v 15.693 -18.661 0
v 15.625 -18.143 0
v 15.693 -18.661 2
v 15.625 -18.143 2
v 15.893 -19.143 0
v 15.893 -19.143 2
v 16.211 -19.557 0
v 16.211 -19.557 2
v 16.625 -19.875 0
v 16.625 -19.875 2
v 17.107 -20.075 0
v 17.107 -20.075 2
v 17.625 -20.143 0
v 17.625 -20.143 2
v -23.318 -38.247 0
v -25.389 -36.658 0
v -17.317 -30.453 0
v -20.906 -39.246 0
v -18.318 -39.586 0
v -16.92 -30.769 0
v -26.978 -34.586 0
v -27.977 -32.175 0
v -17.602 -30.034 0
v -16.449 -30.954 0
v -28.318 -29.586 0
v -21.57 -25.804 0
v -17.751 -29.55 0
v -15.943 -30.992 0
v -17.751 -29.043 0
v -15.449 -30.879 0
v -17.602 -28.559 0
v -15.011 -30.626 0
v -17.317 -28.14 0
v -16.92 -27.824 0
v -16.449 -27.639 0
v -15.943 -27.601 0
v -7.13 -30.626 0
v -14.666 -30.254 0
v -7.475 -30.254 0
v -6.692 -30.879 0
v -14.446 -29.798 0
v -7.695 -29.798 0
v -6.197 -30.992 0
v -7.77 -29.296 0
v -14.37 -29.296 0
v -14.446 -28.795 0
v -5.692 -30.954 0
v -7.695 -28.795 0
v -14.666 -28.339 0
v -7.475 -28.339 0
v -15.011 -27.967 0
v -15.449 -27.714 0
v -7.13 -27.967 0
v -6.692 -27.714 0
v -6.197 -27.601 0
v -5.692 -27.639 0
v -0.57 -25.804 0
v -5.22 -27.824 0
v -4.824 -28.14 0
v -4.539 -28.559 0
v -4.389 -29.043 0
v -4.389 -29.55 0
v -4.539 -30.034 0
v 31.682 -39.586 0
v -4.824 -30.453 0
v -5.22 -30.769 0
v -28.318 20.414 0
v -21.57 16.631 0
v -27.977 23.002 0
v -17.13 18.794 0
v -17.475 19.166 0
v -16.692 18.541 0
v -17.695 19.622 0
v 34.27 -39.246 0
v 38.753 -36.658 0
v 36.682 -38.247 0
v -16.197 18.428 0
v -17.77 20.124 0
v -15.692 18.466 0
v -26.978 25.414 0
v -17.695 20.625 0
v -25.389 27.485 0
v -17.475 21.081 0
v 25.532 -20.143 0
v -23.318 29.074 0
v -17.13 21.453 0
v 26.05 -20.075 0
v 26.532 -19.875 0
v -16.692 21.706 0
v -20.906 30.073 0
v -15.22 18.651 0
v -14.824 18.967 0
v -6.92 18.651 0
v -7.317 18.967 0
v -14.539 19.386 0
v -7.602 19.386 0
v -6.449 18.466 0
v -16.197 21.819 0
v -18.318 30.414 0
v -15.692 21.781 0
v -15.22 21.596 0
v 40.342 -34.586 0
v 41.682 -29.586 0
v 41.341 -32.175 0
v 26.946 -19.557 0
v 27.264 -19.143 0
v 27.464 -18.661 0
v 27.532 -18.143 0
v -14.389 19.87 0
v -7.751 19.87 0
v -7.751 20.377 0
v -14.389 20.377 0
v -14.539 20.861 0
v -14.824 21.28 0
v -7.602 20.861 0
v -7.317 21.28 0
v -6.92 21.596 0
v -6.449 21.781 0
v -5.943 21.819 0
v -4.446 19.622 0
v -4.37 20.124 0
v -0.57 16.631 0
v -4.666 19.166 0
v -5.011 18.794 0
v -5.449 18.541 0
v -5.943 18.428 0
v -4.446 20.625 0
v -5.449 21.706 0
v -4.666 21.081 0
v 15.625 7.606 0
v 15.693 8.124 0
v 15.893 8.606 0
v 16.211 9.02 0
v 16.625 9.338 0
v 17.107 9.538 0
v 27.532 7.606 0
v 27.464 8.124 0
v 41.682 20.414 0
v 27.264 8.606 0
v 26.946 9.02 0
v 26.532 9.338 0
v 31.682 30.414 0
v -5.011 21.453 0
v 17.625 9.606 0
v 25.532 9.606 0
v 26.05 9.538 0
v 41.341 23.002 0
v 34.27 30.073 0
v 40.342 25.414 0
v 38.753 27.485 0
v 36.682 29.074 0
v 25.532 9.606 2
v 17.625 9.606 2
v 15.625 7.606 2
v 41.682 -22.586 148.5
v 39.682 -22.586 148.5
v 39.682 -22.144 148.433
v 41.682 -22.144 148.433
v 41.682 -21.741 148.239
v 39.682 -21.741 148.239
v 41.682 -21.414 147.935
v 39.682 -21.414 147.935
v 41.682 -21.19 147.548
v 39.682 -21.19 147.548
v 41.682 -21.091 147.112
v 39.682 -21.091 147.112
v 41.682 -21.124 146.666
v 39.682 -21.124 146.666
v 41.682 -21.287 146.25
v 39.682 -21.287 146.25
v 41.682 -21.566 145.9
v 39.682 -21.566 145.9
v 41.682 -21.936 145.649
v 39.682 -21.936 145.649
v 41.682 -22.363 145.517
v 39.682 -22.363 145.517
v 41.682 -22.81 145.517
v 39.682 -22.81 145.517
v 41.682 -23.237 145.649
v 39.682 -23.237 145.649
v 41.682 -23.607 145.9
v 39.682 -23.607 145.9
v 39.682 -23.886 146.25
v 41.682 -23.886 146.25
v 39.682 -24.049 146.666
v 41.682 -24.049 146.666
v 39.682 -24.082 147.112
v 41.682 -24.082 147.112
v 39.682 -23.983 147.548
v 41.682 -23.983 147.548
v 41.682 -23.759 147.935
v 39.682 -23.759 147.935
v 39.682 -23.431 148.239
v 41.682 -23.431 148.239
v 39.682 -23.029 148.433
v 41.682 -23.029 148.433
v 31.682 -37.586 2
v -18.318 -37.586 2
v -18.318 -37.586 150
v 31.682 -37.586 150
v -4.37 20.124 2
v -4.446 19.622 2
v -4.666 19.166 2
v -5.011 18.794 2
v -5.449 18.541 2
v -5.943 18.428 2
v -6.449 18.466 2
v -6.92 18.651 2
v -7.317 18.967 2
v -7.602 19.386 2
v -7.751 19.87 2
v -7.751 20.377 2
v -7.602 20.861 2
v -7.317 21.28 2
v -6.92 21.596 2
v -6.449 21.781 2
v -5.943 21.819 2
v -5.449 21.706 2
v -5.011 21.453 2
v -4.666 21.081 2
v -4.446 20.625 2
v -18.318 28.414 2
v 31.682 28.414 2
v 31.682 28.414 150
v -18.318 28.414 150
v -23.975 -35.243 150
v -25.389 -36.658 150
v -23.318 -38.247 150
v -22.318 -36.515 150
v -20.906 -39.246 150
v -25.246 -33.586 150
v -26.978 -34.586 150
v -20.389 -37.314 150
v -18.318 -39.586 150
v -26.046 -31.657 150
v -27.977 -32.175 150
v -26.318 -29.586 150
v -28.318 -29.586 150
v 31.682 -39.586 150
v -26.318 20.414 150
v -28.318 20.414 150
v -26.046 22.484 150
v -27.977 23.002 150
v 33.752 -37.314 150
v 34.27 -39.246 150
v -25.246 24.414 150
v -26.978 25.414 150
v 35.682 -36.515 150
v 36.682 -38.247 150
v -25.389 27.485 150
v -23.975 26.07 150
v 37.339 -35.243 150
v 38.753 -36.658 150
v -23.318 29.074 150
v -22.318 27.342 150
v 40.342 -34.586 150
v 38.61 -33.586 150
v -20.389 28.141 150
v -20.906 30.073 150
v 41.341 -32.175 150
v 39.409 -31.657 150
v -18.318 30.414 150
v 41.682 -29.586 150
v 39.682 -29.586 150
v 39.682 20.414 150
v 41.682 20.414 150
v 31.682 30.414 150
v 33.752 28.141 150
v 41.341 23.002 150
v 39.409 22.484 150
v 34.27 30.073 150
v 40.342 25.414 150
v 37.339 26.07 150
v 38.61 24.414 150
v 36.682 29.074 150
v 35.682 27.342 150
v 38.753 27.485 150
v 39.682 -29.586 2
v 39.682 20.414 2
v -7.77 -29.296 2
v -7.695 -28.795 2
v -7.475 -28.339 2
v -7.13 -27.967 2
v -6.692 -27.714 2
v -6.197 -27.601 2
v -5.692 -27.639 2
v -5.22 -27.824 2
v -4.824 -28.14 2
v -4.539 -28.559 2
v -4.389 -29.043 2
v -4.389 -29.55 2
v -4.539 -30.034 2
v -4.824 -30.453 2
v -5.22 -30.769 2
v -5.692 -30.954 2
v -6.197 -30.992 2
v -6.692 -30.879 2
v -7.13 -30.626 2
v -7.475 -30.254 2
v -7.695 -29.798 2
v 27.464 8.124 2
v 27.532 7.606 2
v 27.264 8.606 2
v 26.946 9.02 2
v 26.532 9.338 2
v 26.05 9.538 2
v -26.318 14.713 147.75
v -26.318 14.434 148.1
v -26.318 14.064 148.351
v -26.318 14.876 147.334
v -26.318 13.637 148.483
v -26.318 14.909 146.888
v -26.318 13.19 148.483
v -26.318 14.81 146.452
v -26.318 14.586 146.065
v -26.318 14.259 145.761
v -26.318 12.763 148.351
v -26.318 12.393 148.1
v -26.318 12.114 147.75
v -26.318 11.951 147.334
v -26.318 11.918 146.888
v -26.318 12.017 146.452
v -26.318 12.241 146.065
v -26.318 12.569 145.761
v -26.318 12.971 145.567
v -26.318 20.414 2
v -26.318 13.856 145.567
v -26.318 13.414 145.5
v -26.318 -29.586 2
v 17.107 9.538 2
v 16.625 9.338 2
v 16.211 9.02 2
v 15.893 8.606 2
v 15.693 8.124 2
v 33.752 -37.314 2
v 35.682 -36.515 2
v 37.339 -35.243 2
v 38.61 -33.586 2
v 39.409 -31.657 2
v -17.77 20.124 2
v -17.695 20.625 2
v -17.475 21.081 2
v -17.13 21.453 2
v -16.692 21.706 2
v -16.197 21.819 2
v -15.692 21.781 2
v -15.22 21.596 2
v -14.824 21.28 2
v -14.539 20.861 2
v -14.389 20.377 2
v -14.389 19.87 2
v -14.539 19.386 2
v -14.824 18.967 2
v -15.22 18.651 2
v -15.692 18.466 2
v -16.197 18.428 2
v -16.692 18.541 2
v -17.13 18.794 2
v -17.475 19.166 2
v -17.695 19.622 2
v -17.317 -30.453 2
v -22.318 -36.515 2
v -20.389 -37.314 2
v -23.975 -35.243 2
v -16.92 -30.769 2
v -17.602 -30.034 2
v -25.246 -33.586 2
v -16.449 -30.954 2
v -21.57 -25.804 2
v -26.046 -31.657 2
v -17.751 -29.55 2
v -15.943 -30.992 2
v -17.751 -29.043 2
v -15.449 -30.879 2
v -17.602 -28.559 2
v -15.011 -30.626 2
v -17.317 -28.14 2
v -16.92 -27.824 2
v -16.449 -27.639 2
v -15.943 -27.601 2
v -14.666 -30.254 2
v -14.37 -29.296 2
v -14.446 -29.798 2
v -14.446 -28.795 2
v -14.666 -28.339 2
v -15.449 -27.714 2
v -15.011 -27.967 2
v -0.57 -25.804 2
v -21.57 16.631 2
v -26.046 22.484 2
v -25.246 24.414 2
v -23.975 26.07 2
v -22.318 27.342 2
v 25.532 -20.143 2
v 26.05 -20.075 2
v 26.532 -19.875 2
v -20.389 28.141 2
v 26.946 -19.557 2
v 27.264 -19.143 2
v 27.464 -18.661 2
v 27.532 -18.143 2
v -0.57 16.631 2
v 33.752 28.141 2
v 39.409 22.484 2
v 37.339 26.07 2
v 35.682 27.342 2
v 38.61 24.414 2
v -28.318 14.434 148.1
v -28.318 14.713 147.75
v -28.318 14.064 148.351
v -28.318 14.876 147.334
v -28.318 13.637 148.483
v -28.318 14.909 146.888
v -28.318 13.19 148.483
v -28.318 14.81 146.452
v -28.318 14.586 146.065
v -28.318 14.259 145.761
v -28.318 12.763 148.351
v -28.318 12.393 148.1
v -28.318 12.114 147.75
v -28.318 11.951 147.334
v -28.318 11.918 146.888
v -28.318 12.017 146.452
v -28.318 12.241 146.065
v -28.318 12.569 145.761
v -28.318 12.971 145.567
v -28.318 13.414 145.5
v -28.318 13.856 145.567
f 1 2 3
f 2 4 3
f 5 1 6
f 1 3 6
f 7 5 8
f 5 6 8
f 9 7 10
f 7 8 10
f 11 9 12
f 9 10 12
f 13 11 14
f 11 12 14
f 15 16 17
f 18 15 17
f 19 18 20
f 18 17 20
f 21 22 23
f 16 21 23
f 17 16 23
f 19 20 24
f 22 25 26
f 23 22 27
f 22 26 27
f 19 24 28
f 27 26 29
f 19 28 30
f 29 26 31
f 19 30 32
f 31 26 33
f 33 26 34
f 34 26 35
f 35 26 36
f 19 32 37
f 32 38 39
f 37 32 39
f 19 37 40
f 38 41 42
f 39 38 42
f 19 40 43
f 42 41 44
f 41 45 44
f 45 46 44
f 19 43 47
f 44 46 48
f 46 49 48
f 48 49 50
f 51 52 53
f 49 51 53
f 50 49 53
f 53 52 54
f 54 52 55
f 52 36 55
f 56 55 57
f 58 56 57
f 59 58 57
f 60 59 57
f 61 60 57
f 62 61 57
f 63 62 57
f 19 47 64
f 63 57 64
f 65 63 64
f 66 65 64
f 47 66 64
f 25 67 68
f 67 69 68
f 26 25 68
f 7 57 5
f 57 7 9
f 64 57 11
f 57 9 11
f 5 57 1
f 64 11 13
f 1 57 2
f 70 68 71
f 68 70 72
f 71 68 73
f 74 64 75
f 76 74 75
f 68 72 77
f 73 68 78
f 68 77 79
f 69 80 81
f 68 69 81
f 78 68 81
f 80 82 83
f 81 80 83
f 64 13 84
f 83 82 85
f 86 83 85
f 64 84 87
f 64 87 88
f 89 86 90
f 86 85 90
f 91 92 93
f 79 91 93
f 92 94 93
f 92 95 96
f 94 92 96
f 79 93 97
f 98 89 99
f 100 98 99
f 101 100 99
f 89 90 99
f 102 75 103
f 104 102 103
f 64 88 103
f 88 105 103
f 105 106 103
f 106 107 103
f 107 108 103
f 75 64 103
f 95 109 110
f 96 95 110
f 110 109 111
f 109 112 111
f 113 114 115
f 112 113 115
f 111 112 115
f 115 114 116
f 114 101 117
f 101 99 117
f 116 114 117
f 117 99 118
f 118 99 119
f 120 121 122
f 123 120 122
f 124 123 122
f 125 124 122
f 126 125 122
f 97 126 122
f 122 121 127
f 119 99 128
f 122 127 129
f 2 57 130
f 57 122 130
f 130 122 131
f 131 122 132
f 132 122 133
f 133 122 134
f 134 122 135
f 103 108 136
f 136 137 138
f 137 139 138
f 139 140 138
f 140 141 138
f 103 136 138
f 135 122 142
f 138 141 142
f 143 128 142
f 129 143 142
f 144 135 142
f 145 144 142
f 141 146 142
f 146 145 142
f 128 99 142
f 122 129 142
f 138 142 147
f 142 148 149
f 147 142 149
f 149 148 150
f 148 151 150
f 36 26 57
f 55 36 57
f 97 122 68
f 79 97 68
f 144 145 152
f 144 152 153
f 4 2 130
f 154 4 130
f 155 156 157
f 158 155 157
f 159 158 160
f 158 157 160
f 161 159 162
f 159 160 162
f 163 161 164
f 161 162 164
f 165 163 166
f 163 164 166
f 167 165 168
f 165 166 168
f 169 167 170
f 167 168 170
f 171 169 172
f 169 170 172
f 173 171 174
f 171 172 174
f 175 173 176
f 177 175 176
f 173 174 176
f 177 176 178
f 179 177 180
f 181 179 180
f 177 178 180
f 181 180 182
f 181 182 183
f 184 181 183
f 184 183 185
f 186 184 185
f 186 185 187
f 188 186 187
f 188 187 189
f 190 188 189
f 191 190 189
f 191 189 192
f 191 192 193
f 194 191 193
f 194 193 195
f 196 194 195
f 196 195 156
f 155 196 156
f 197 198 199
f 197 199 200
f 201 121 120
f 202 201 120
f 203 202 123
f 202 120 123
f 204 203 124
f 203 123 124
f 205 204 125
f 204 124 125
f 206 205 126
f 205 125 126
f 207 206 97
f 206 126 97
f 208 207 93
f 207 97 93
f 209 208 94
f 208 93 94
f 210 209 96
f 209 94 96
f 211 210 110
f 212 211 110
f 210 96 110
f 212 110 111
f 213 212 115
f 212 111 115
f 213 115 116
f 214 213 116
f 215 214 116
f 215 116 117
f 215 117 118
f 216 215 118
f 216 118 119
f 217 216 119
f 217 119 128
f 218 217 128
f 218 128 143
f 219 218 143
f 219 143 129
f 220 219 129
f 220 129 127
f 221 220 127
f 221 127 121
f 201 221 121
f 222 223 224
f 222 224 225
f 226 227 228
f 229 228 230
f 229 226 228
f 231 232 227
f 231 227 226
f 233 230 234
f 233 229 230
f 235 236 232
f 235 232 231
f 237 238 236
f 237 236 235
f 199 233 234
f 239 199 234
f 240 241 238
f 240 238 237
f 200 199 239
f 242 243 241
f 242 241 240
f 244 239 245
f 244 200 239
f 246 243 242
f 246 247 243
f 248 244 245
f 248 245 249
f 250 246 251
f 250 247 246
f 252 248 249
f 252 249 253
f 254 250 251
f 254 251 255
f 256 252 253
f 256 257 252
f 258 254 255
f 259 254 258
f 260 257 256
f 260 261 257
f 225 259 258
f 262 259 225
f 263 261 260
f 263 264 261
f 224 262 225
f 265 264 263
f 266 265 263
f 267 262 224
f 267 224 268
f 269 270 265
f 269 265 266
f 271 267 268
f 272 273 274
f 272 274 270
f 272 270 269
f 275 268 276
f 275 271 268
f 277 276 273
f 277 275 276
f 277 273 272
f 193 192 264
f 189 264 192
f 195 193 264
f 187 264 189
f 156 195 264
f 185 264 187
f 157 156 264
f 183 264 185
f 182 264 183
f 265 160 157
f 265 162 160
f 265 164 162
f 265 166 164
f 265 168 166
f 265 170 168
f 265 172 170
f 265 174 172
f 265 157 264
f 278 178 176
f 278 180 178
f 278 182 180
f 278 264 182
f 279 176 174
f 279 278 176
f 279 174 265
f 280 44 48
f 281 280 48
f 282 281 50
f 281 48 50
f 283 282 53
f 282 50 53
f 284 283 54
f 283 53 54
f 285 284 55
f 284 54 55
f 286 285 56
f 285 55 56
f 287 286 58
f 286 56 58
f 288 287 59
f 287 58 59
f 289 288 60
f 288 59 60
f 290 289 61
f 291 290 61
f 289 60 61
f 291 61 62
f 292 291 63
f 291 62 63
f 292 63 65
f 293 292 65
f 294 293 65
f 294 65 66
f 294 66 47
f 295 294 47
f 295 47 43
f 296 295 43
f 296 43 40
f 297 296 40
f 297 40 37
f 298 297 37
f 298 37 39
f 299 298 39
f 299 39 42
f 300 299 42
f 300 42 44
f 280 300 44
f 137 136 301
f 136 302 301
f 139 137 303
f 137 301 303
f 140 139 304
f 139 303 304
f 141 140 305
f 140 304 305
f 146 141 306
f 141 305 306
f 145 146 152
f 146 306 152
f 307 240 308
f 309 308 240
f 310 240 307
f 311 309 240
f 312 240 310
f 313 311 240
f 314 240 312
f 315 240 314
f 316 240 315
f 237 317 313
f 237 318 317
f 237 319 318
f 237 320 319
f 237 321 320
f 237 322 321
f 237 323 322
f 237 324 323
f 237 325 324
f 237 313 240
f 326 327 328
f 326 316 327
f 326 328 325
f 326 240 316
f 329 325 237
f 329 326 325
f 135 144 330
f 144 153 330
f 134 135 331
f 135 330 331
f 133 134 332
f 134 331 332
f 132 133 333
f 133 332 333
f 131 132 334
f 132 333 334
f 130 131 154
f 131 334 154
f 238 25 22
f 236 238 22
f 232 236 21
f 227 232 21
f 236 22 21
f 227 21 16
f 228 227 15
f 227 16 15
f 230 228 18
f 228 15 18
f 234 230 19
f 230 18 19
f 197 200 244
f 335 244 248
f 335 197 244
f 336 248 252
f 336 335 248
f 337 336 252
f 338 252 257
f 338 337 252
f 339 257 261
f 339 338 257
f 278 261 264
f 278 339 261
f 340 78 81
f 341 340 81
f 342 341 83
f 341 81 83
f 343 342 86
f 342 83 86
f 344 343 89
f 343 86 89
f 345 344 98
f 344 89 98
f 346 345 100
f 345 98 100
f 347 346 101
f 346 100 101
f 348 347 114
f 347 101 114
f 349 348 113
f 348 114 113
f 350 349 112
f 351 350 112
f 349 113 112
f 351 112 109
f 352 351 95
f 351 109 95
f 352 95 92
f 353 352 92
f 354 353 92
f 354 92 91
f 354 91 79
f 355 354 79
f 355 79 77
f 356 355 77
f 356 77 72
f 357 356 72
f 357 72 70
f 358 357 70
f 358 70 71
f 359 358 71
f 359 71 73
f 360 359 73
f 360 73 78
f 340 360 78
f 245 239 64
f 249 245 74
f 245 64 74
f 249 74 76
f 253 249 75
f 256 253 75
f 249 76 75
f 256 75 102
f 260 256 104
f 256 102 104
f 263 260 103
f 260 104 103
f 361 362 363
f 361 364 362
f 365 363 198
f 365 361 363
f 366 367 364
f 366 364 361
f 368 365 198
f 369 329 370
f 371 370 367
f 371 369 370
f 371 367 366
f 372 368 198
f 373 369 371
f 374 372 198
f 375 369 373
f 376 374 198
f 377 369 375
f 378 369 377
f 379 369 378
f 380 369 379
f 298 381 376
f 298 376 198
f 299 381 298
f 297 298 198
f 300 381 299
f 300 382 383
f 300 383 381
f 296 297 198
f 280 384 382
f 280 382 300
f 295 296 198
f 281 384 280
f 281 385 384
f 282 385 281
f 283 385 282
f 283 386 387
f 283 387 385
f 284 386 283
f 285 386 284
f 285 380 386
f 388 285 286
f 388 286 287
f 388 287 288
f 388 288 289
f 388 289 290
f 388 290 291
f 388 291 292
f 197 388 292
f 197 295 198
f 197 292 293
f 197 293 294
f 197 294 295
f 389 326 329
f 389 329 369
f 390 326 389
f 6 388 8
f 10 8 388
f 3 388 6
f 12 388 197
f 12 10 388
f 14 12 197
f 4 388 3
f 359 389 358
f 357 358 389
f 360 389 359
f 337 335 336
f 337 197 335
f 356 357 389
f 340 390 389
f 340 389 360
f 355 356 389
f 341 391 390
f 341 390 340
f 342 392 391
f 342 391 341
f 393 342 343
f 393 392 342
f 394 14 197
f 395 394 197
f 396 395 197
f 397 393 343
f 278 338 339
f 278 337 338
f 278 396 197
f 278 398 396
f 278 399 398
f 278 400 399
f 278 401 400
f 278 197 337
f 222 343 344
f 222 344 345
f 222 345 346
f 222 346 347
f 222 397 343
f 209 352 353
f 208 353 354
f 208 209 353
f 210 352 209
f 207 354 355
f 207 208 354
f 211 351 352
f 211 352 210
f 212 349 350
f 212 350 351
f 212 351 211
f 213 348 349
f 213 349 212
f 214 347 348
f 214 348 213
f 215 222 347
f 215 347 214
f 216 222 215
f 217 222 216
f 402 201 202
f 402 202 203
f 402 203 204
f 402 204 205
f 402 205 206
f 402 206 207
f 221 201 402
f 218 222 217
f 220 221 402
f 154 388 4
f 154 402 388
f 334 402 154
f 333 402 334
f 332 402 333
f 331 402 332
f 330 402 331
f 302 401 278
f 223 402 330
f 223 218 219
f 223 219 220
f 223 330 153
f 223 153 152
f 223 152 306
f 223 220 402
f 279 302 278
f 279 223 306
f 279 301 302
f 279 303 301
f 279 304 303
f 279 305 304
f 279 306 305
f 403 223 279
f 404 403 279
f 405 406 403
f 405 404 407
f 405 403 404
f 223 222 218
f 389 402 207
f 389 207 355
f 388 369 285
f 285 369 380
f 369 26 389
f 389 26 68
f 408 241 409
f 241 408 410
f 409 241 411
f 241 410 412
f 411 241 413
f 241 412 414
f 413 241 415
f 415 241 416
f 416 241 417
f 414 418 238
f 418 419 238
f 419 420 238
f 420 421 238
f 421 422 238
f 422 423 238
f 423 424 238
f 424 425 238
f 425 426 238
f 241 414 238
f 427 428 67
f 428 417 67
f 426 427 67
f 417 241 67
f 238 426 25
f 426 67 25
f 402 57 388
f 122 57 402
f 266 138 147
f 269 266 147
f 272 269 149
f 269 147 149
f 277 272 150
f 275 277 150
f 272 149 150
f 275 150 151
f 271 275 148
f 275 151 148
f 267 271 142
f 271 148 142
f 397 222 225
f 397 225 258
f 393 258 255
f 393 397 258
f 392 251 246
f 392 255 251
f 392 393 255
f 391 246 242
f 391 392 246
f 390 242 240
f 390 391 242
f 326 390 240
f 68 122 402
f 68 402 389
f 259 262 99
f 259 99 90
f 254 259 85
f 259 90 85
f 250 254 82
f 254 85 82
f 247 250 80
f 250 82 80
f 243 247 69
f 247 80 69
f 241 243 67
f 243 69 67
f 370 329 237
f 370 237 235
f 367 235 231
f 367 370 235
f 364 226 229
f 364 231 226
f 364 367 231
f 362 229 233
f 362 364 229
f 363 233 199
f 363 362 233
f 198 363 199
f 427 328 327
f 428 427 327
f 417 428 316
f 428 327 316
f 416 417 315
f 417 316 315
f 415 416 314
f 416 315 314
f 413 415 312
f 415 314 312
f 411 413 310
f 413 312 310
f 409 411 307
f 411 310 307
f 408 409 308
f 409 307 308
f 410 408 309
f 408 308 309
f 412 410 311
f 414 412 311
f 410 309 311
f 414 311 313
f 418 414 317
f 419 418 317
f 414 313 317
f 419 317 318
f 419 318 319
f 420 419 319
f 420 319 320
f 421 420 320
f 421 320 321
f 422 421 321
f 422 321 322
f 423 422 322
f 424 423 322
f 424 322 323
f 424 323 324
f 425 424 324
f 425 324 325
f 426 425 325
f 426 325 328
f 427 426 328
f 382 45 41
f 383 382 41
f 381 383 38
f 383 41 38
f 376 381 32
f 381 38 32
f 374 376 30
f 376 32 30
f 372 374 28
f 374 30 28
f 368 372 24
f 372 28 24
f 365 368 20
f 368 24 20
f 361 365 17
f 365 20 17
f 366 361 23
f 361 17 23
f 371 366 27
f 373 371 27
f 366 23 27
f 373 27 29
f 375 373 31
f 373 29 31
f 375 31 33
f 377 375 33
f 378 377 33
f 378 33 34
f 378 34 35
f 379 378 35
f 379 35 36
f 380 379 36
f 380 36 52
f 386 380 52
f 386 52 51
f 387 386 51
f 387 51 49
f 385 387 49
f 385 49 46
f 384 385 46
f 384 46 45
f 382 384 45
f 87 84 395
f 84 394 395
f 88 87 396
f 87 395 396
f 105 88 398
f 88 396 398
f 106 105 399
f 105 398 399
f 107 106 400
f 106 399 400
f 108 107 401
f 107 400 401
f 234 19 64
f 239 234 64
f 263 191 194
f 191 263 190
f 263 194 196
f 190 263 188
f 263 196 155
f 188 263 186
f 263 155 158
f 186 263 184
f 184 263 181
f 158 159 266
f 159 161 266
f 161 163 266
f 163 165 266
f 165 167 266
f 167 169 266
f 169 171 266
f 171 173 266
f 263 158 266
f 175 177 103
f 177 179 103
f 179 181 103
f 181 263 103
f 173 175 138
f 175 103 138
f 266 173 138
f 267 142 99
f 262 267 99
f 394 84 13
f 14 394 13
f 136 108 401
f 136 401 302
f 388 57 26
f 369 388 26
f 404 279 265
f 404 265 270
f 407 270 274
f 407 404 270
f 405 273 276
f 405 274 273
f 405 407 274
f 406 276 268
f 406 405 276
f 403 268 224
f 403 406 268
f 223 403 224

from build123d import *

# Parameters (mm, degrees)
EXTRUDE_1_DEPTH     = 150
SHELL_1_T           = -2
SKETCH_2_R          = 1.7
SKETCH_2_W          = 21
SKETCH_2_H          = 42.435234345
CUT_EXTRUDE_1_DEPTH = 150
SKETCH_3_W          = 11.907125669
SKETCH_3_H          = 29.749118518
CUT_EXTRUDE_2_DEPTH = 10
FILLET_1_R          = 2
FILLET_2_R          = 2
FILLET_3_R          = 2
FILLET_4_R          = 2
SKETCH_4_R          = 1.5
CUT_EXTRUDE_3_DEPTH = 7
SKETCH_5_R          = 1.5
CUT_EXTRUDE_4_DEPTH = 7


with BuildPart() as part:
    # 草图1 → 凸台-拉伸1 (new body)
    with BuildSketch(Plane.XY):
        with BuildLine():
            Line((-28.318229719, 20.413532085), (-28.318229719, -29.586467915))
            ThreePointArc((-28.318229719, -29.586467915), (-25.38929753, -36.657535727), (-18.318229719, -39.586467915))
            Line((-18.318229719, -39.586467915), (31.681770281, -39.586467915))
            ThreePointArc((31.681770281, -39.586467915), (38.752838093, -36.657535727), (41.681770281, -29.586467915))
            Line((41.681770281, -29.586467915), (41.681770281, 20.413532085))
            ThreePointArc((41.681770281, 20.413532085), (38.752838093, 27.484599896), (31.681770281, 30.413532085))
            Line((31.681770281, 30.413532085), (-18.318229719, 30.413532085))
            ThreePointArc((-18.318229719, 30.413532085), (-25.38929753, 27.484599896), (-28.318229719, 20.413532085))
        make_face()
    extrude(amount=EXTRUDE_1_DEPTH)

    # 抽壳1
    shell_1_openings = [part.faces().sort_by_distance(p)[0] for p in [
        (6.681770281, -4.586467915, 150),
    ]]
    offset(amount=SHELL_1_T, openings=shell_1_openings, kind=Kind.INTERSECTION)

    # 草图2 → 切除-拉伸1 (cut)
    with BuildSketch(Plane(origin=(0, 0, 0), x_dir=(-1, 0, 0), z_dir=(0, 0, -1))):
        with Locations((16.070445421, 20.123532085)):
            Circle(SKETCH_2_R)
        with Locations(Location((6.070445421, 20.123532085, 0), (0, 0, 180))):
            Circle(SKETCH_2_R)
        with Locations(Location((16.070445421, -29.296467915, 0), (0, 0, 180))):
            Circle(SKETCH_2_R)
        with Locations((6.070445421, -29.296467915)):
            Circle(SKETCH_2_R)
        with Locations((11.070445421, -4.586467916)):
            Rectangle(SKETCH_2_W, SKETCH_2_H)
    extrude(amount=-CUT_EXTRUDE_1_DEPTH, mode=Mode.SUBTRACT)

    # 草图3 → 切除-拉伸2 (cut)
    with BuildSketch(Plane(origin=(0, 0, 0), x_dir=(-1, 0, 0), z_dir=(0, 0, -1))):
        with Locations((-21.578307669, -5.268329048)):
            Rectangle(SKETCH_3_W, SKETCH_3_H)
    extrude(amount=-CUT_EXTRUDE_2_DEPTH, mode=Mode.SUBTRACT)

    # 圆角1
    fillet_1_edges = [part.edges().sort_by_distance(p)[0] for p in [
        (15.624744835, 9.606230211, 1),
    ]]
    fillet(fillet_1_edges, radius=FILLET_1_R)

    # 圆角2
    fillet_2_edges = [part.edges().sort_by_distance(p)[0] for p in [
        (15.624744835, -20.142888307, 1),
    ]]
    fillet(fillet_2_edges, radius=FILLET_2_R)

    # 圆角3
    fillet_3_edges = [part.edges().sort_by_distance(p)[0] for p in [
        (27.531870504, -20.142888307, 1),
    ]]
    fillet(fillet_3_edges, radius=FILLET_3_R)

    # 圆角4
    fillet_4_edges = [part.edges().sort_by_distance(p)[0] for p in [
        (27.531870504, 9.606230211, 1),
    ]]
    fillet(fillet_4_edges, radius=FILLET_4_R)

    # 草图4 → 切除-拉伸3 (cut)
    with BuildSketch(Plane.ZY.offset(-39.681770281)):
        with Locations((147, -22.586467915)):
            Circle(SKETCH_4_R)
    extrude(amount=-CUT_EXTRUDE_3_DEPTH, mode=Mode.SUBTRACT)

    # 草图5 → 切除-拉伸4 (cut)
    with BuildSketch(Plane(origin=(-26.318229719, 0, 0), x_dir=(0, 0, -1), z_dir=(1, 0, 0))):
        with Locations((-147, 13.413532085)):
            Circle(SKETCH_5_R)
    extrude(amount=-CUT_EXTRUDE_4_DEPTH, mode=Mode.SUBTRACT)


solid = part.part
